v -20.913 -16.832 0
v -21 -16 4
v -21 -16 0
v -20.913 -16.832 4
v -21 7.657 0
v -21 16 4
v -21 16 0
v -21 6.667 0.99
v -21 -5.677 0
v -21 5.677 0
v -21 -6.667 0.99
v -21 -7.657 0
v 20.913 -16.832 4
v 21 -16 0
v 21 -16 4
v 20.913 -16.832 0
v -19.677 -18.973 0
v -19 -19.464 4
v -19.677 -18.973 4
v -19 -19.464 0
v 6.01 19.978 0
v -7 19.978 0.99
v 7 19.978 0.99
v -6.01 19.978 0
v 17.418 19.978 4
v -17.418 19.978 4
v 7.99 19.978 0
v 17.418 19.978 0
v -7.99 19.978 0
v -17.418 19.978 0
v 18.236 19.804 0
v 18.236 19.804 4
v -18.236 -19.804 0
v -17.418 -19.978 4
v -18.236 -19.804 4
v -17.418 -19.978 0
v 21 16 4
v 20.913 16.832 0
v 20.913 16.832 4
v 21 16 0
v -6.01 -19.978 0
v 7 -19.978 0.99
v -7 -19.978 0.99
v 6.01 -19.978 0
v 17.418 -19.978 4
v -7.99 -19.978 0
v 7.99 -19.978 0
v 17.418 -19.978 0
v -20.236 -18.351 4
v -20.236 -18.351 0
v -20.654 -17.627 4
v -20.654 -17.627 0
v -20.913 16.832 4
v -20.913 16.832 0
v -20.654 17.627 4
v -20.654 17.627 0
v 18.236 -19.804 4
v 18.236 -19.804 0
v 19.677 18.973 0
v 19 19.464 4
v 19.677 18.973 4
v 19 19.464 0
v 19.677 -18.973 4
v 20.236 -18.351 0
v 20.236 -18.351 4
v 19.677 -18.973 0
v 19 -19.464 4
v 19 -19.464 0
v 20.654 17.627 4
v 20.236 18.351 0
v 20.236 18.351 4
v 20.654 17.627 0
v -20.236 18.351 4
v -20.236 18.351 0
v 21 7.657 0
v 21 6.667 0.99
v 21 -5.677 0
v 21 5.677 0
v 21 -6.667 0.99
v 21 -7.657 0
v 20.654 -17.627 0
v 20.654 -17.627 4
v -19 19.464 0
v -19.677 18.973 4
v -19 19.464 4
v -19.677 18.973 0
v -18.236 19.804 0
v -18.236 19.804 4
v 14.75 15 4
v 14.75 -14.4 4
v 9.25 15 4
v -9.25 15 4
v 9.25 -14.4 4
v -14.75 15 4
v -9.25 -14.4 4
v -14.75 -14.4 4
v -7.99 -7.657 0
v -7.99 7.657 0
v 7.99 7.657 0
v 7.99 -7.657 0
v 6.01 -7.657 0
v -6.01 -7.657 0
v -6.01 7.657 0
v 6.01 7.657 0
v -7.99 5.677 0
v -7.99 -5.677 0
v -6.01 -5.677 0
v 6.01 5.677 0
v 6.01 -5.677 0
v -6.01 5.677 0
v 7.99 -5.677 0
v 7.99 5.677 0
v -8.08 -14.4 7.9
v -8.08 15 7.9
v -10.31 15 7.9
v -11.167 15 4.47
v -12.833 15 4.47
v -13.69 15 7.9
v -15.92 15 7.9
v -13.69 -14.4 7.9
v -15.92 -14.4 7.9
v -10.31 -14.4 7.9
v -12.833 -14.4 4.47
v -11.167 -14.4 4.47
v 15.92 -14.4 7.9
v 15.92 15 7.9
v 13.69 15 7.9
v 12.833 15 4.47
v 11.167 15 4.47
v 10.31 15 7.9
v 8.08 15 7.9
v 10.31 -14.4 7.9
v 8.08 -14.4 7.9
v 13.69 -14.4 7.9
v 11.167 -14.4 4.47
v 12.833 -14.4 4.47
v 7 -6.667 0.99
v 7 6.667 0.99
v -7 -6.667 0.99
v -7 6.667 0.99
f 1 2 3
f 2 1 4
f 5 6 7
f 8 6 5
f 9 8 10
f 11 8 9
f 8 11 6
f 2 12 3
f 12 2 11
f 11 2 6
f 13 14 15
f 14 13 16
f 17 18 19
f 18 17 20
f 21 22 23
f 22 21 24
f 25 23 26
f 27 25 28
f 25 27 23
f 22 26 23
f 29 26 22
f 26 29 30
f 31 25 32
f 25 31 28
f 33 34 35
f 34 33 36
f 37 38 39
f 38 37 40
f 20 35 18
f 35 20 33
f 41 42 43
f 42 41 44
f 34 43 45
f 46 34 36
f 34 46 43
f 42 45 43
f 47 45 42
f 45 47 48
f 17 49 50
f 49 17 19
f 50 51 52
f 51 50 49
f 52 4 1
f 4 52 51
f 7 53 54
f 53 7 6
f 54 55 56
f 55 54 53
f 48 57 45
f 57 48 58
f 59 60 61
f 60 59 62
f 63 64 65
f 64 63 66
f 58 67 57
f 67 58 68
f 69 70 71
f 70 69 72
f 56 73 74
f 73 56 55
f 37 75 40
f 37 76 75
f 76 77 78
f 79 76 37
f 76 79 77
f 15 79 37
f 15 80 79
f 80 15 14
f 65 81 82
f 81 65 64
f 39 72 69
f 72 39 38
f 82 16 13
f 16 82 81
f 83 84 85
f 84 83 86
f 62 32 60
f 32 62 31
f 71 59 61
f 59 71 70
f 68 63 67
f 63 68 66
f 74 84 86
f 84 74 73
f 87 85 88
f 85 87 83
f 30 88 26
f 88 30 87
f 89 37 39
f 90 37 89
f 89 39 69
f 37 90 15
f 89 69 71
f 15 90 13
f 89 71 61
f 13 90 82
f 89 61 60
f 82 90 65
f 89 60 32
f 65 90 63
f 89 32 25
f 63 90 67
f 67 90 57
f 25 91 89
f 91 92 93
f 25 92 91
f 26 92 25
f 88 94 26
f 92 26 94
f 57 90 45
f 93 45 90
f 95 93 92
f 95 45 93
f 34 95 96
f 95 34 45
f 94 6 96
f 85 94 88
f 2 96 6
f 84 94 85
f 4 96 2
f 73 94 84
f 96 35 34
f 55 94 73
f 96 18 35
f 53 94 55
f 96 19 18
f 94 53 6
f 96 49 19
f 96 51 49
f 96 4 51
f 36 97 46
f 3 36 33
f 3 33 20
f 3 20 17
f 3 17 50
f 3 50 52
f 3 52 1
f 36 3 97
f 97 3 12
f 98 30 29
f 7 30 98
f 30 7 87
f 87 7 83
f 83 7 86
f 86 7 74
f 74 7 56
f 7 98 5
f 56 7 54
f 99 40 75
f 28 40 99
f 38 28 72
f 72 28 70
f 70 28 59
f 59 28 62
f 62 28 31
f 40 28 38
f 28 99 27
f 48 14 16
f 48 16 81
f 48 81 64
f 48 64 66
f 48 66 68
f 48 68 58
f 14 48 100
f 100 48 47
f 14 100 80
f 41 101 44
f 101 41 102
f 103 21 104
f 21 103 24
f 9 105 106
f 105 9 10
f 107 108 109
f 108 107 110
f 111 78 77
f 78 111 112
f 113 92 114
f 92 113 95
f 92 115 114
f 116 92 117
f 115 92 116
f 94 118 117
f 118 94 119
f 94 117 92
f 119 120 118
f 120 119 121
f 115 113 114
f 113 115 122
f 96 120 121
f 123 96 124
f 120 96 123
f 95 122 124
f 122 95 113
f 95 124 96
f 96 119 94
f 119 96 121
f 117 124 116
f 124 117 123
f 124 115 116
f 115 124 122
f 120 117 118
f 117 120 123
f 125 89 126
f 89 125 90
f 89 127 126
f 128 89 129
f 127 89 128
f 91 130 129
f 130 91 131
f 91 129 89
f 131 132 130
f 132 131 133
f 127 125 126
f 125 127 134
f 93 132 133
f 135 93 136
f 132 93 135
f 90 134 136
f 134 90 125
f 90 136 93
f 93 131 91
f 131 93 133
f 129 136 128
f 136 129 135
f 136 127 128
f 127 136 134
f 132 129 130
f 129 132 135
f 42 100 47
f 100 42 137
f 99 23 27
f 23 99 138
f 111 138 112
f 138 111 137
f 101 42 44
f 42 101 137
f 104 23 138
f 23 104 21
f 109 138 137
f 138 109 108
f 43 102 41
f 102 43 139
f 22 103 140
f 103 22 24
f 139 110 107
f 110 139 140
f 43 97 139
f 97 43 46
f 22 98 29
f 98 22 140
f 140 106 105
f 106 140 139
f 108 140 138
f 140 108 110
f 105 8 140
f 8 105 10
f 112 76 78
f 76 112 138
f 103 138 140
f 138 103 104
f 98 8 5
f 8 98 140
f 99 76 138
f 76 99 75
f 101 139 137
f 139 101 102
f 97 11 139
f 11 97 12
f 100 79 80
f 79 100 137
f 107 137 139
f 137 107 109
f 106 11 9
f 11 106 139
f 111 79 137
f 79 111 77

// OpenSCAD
// file: ../Dollo/NEW_long_ties/globals.scad
/*
Most things in this file is represented as one millimeter, so keep that in mind while changing things.
Some of the setting are not mm but at variables that you can set, such as 2*x=2x and you are setting what x is.
I will try to specify when things are variables and not exact measurements.
*/

// printer slop
slop = 0.15;

obj_leg = 30;
leg_length = 5.5;
small_number = 0.001;
metal_core_rode_global = 5;


///////////////// number of holes /////////////////////
z_hole_number = 8;
other_holes = 8;

///////////////// Pins /////////////////////

//pins that poke out
ball_size = 10;
pin_height = 20;
pin_diameter = 6;


//holes
hole_ball_size = ball_size;
hole_pin_height = pin_height;
hole_pin_diameter = pin_diameter;

///////////////// Z THINGS /////////////////////

berring_slot_width = 7.5;
berring_slot_depth = 6.5;
metal_core_rode = 5;

///////////////// X THINGS /////////////////////

//male dove tails
male_dove_max_width=8;
male_dove_min_width=5;
male_dove_depth=5;
male_dove_height=obj_leg/2;

function scaled_male_dove_max_width() = male_dove_max_width - slop;
function scaled_male_dove_min_width() = male_dove_min_width - slop;
function scaled_male_dove_depth() = male_dove_depth - slop;

//female dove tails, this is found on the y mounts
girl_max_width=11;
girl_min_width=5;
girl_depth=5;
girl_height=obj_leg;


///////////////// Y THINGS /////////////////////
/*
The Y is so normal that all of those global variables at the top should change all of the setting in it, this section is set her incase there are variables set in the future development of this project.
*/

// stepper
motor_side_length = 43.2;
motor_bolt_hole_distance = 31;
motor_center_hole = 23;
motor_shaft_dia = 5;
motor_shaft_hole_dia = 5+2*slop;

// bolts etc.
bolt_hole_dia = 3+2*slop;
bolt_head_hole_dia = 5.8;

m4_bolt_hole_dia = 4+2*slop;
m4_bolt_head_hole_dia = 6.8+2*slop;


m3_nut_side = 5.65;
m3_nut_height = 2.3;
m4_nut_side = 6.85;
m4_nut_height = 3.1;

// threaded rod
lifter_rod_diam = 9.86;
hole_threaded_rod = lifter_rod_diam+2*slop;

// for the extensions
metal_rod_size = 9;
// main file
use <../Dollo/NEW_long_ties/include.scad>;

// calculations
bottom_rod = 12.5 + 6.4 + 1.5 + 6 + 2 + 36 + 1.5 + 8;
echo(bottom_rod);

long_rod = 312 + 6 + 1.5 + 8 - 1.5 - 6.4 - 12.5;
echo(long_rod);



//frame_mockup();
//platform_mockup();

//chute_top();
//container();
//container_lid();

//platform_leg_1();
//platform_leg_2();
platform_leg_soft_pad();


module _bottom() {
    difference() {
        translate([0, 0, 6/2])
        rounded_cube_side(
            196.5, 162, 6, 12, center=true, $fn=30
        );

        translate([-177/2, 132/2, 0])
        cylinder(d=9, h=20, center=true, $fn=30);

        translate([-177/2, -132/2, 0])
        cylinder(d=9, h=20, center=true, $fn=30);

        translate([177/2, 132/2, 0])
        cylinder(d=9, h=20, center=true, $fn=30);

        translate([177/2, -132/2, 0])
        cylinder(d=9, h=20, center=true, $fn=30);


        translate([-104.5/2, 143/2, 0])
        cube([20.3, 6.3, 20], center=true);

        translate([-104.5/2, -143/2, 0])
        cube([20.3, 6.3, 20], center=true);

        translate([104.5/2, 143/2, 0])
        cube([20.3, 6.3, 20], center=true);

        translate([104.5/2, -143/2, 0])
        cube([20.3, 6.3, 20], center=true);
    }
}

module _wall() {
    rotate([0, 0, 90])
    difference() {
        union() {
            cube([6, 155, 312], center=true);

            translate([0, 104.5/2, -312/2])
            cube([6, 20, 12], center=true);

            translate([0, -104.5/2, -312/2])
            cube([6, 20, 12], center=true);

            translate([0, 94.5/2, 312/2])
            cube([6, 20, 12], center=true);

            translate([0, -94.5/2, 312/2])
            cube([6, 20, 12], center=true);
        }

        translate([0, 104.5/2, 312/2 - 80 - 6.3/2])
        cube([20, 20.3, 6.3], center=true);

        translate([0, -104.5/2, 312/2 - 80 - 6.3/2])
        cube([20, 20.3, 6.3], center=true);

    }
}

module _shelf() {
    union() {
        translate([0, 0, 6/2])
        cube([155, 137, 6], center=true);

        translate([-104.5/2, 0, 6/2])
        cube([20, 149, 6], center=true);

        translate([104.5/2, 0, 6/2])
        cube([20, 149, 6], center=true);
    }
}

module _top() {
    difference() {
        translate([0, 0, 6/2])
        rounded_cube_side(
            196.5, 162, 6, 12, center=true, $fn=30
        );

        translate([0, -93/2 + 162/2 - 21, 0])
        rounded_cube_side(
            141, 93, 20, 12, center=true, $fn=30
        );

        translate([-177/2, 132/2, 0])
        cylinder(d=9, h=20, center=true, $fn=30);

        translate([-177/2, -132/2, 0])
        cylinder(d=9, h=20, center=true, $fn=30);

        translate([177/2, 132/2, 0])
        cylinder(d=9, h=20, center=true, $fn=30);

        translate([177/2, -132/2, 0])
        cylinder(d=9, h=20, center=true, $fn=30);


        translate([-94.5/2, 143/2, 0])
        cube([20.3, 6.3, 20], center=true);

        translate([-94.5/2, -143/2, 0])
        cube([20.3, 6.3, 20], center=true);

        translate([94.5/2, 143/2, 0])
        cube([20.3, 6.3, 20], center=true);

        translate([94.5/2, -143/2, 0])
        cube([20.3, 6.3, 20], center=true);
    }
}

module frame_mockup() {
    _bottom();

    translate([0, 0, 312 + 6])
    _top();

    translate([0, 143/2, 312/2 + 6])
    _wall();

    translate([0, -143/2, 312/2 + 6])
    _wall();

//    translate([0, 0, 312 - 80.15])
//    _shelf();

    translate([0, 0, 312 - 80.15])
    chute_top();

    color("grey")
    translate([-177/2, 132/2, 0])
    cylinder(d=8, h=340, $fn=30);

    color("grey")
    translate([177/2, 132/2, 0])
    cylinder(d=8, h=340, $fn=30);

    color("grey")
    translate([-177/2, -132/2, 0])
    cylinder(d=8, h=340, $fn=30);

    color("grey")
    translate([177/2, -132/2, 0])
    cylinder(d=8, h=340, $fn=30);

    color("grey")
    translate([-177/2, 132/2, 6])
    cylinder(d=16, h=40, $fn=30);

    color("grey")
    translate([177/2, 132/2, 6])
    cylinder(d=16, h=40, $fn=30);

    color("grey")
    translate([-177/2, -132/2, 6])
    cylinder(d=16, h=40, $fn=30);

    color("grey")
    translate([177/2, -132/2, 6])
    cylinder(d=16, h=40, $fn=30);

    intersection() {
        color("lightgrey")
        translate([0, 0, 6])
        container();

        translate([0, 500/2, 0])
        cube([500, 500, 1000], center=true);
    }

    translate([0, 0, 231.2])
    rotate([180, 0, 0])
    container_lid();

    rotate([0, 0, 180])
    translate([0, -22, -72])
    platform_mockup();
}

module platform_mockup() {
    translate([0, 0, 33/2 + 38])
    cube([1000, 206, 33], center=true);

    translate([1000/2 - 42/2, -44/2, 38/2])
    cube([42, 250, 38], center=true);

    translate([-1000/2 + 42/2, -44/2, 38/2])
    cube([42, 250, 38], center=true);

    translate([-1000/2 + 42/2, -154.3, 38/2 - 1])
    rotate([-102, 0, 0])
    intersection() {
        platform_leg_1();

        translate([100/2, 0, 0])
        cube([100, 100, 200], center=true);
    }

    translate([-1000/2 + 42/2, 107.3, 38/2 - 3])
    rotate([90, 0, 0])
    platform_leg_2();

    translate([-1000/2 + 42/2, -134.3, -10])
    platform_leg_soft_pad();

    translate([-1000/2 + 42/2, 84.3, -10])
    platform_leg_soft_pad();
}

module chute_top() {
    difference() {
        union() {
            _shelf();

            translate([0, 0, 6/2])
            rounded_cube_side(
                185, 122, 6, 10, center=true, $fn=30
            );

            hull() {
                translate([0, 0, 0.1/2])
                rounded_cube_side(
                    151, 105, 0.1, 8, center=true, $fn=30
                );

                translate([0, 14,  86 - 0.1/2])
                rounded_cube_side(
                    153, 105, 0.1, 8, center=true, $fn=30
                );
            }
        }

        hull() {
            translate([0, 0, 0.1/2])
            rounded_cube_side(
                147, 101, 0.2, 4, center=true, $fn=30
            );

            translate([0, 14,  86 - 0.1/2])
            rounded_cube_side(
                149, 101, 0.2, 4, center=true, $fn=30
            );
        }

        translate([52.5, -70, 6/2])
        rotate([90, 0, 0])
        cylinder(d=2.6, h=20, center=true, $fn=20);

        translate([52.5, 70, 6/2])
        rotate([90, 0, 0])
        cylinder(d=2.6, h=20, center=true, $fn=20);

        translate([-52.5, -70, 6/2])
        rotate([90, 0, 0])
        cylinder(d=2.6, h=20, center=true, $fn=20);

        translate([-52.5, 70, 6/2])
        rotate([90, 0, 0])
        cylinder(d=2.6, h=20, center=true, $fn=20);
    }
}

module container() {
    difference() {
        union() {
            translate([0, 0, 42/2])
            rounded_cube_side(
                205, 115, 42, 15, center=true, $fn=30
            );

            hull() {
                translate([0, 0, 42 - 1/2])
                rounded_cube_side(
                    205, 115, 1, 15, center=true, $fn=30
                );

                translate([0, 0, 48 + (223.2 - 48)/2])
                rounded_cube_side(
                    205, 123, 223.2 - 48,
                    15, center=true, $fn=30
                );
            }
        }

        union() {
            translate([0, 0, 400/2 + 2])
            rounded_cube_side(
                202, 112, 400, 12, center=true, $fn=30
            );

            hull() {
                translate([0, 0, 42.5 - 1/2])
                rounded_cube_side(
                    202, 112, 1, 12, center=true, $fn=30
                );

                translate([0, 0, 48.5 + 226/2])
                rounded_cube_side(
                    202, 120, 226,
                    12, center=true, $fn=30
                );
            }
        }

        for(i = [0:7]) {
            translate([0, -42 + i*12, 0])
            rotate([45, 0, 0])
            cube([180, 1, 1], center=true);
        }
    }
}

module container_lid() {
    difference() {
        union() {
            translate([0, 0, 2/2])
            rounded_cube_side(
                205, 123, 2,
                15, center=true, $fn=30
            );

            translate([0, 0, 12/2])
            rounded_cube_side(
                201, 119, 12,
                11, center=true, $fn=30
            );

        }

        translate([0, 0, 1.8 + 12/2])
        rounded_cube_side(
            198, 116, 12,
            8, center=true, $fn=30
        );

        rounded_cube_side(
            160, 105, 10, 8, center=true, $fn=30
        );
    }
}

module _screw_head_hole() {
    translate([0, 0, 10])
    rotate([180, 0, 0])
    union() {
        cylinder(d=4.6, h=11, $fn=30);
        cylinder(d=9.1, h=4, center=true, $fn=30);

        translate([0, 0, 1.99])
        cylinder(d1=9.1, d2=4.6, h=3, $fn=30);
    }
}

module platform_leg_1() {
    difference() {
        union() {
            rotate([12, 0, 0])
            hull() {
                translate([50/2 - 8/2, 48/2 - 8/2, -1.05])
                sphere(d=8, $fn=40);

                translate([50/2 - 8/2, 48/2 - 8/2, 50])
                cylinder(d=8, h=1, $fn=40);

                translate([-50/2 + 8/2, 48/2 - 8/2, -1.05])
                sphere(d=8, $fn=40);

                translate([-50/2 + 8/2, 48/2 - 8/2, 50])
                cylinder(d=8, h=1, $fn=40);

                translate([50/2 - 8/2, -48/2 + 8/2, 7.46])
                sphere(d=8, $fn=40);

                translate([50/2 - 8/2, -48/2 + 8/2, 50])
                cylinder(d=8, h=1, $fn=40);

                translate([-50/2 + 8/2, -48/2 + 8/2, 7.46])
                sphere(d=8, $fn=40);

                translate([-50/2 + 8/2, -48/2 + 8/2, 50])
                cylinder(d=8, h=1, $fn=40);
            }
        }

        translate([0, 0, -10/2])
        cube([100, 100, 10], center=true);

        translate([0, 0, 0])
        rotate([12, 0, 0])
        translate([0, -1, 44/2 + 7.1])
        cube([42, 38, 44], center=true);

        rotate([12, 0, 0])
        translate([0, 15, 15])
        rotate([-90, 0, 0])
        _screw_head_hole();

        rotate([12, 0, 0])
        translate([0, 15, 42])
        rotate([-90, 0, 0])
        _screw_head_hole();

        rotate([12, 0, 0])
        translate([12, 48/2 + 1, 4])
        rotate([0, 0, 180])
        male_dovetail();

        rotate([12, 0, 0])
        translate([-12, 48/2 + 1, 4])
        rotate([0, 0, 180])
        male_dovetail();
    }
}

module platform_leg_2() {
    difference() {
        translate([0, 0, 50/2 - 1])
        rounded_cube(50, 44, 50, 8, center=true, $fn=40);

        translate([0, 0, -10/2])
        cube([100, 100, 10], center=true);

        translate([0, -44/2 + 40/2 + 6, 50/2 + 4])
        cube([42, 40, 50], center=true);

        translate([0, -13, 40])
        rotate([90, 0, 0])
        _screw_head_hole();

        translate([0, -13, 15])
        rotate([90, 0, 0])
        _screw_head_hole();

        translate([12, -48/2 + 1, 10])
        male_dovetail();

        translate([-12, -48/2 + 1, 10])
        male_dovetail();
    }
}

module platform_leg_soft_pad() {
    module _dovetail() {
        difference() {
            male_dovetail(30);

            hull() {
                translate([0, 2, 0])
                cube([1.7, 1, 100], center=true);

                translate([0, 6, 0])
                cube([3.7, 1, 100], center=true);
            }
        }
    }

    difference() {
        union() {
            translate([0, 0, 4/2])
            rounded_cube_side(
                42, 40, 4, 8, center=true, $fn=30
            );

            translate([-12, 30/2, 3])
            rotate([90, 0, 0])
            scale(0.98)
            _dovetail();

            translate([12, 30/2, 3])
            rotate([90, 0, 0])
            scale(0.98)
            _dovetail();
        }

        translate([42/6, 0, 0])
        rotate([0, 45, 0])
        cube([1.4, 50, 1.4], center=true);

        translate([-42/6, 0, 0])
        rotate([0, 45, 0])
        cube([1.4, 50, 1.4], center=true);

        translate([0, 40/6, 0])
        rotate([45, 0, 0])
        cube([50, 1.4, 1.4], center=true);

        translate([0, -40/6, 0])
        rotate([45, 0, 0])
        cube([50, 1.4, 1.4], center=true);
    }
}
